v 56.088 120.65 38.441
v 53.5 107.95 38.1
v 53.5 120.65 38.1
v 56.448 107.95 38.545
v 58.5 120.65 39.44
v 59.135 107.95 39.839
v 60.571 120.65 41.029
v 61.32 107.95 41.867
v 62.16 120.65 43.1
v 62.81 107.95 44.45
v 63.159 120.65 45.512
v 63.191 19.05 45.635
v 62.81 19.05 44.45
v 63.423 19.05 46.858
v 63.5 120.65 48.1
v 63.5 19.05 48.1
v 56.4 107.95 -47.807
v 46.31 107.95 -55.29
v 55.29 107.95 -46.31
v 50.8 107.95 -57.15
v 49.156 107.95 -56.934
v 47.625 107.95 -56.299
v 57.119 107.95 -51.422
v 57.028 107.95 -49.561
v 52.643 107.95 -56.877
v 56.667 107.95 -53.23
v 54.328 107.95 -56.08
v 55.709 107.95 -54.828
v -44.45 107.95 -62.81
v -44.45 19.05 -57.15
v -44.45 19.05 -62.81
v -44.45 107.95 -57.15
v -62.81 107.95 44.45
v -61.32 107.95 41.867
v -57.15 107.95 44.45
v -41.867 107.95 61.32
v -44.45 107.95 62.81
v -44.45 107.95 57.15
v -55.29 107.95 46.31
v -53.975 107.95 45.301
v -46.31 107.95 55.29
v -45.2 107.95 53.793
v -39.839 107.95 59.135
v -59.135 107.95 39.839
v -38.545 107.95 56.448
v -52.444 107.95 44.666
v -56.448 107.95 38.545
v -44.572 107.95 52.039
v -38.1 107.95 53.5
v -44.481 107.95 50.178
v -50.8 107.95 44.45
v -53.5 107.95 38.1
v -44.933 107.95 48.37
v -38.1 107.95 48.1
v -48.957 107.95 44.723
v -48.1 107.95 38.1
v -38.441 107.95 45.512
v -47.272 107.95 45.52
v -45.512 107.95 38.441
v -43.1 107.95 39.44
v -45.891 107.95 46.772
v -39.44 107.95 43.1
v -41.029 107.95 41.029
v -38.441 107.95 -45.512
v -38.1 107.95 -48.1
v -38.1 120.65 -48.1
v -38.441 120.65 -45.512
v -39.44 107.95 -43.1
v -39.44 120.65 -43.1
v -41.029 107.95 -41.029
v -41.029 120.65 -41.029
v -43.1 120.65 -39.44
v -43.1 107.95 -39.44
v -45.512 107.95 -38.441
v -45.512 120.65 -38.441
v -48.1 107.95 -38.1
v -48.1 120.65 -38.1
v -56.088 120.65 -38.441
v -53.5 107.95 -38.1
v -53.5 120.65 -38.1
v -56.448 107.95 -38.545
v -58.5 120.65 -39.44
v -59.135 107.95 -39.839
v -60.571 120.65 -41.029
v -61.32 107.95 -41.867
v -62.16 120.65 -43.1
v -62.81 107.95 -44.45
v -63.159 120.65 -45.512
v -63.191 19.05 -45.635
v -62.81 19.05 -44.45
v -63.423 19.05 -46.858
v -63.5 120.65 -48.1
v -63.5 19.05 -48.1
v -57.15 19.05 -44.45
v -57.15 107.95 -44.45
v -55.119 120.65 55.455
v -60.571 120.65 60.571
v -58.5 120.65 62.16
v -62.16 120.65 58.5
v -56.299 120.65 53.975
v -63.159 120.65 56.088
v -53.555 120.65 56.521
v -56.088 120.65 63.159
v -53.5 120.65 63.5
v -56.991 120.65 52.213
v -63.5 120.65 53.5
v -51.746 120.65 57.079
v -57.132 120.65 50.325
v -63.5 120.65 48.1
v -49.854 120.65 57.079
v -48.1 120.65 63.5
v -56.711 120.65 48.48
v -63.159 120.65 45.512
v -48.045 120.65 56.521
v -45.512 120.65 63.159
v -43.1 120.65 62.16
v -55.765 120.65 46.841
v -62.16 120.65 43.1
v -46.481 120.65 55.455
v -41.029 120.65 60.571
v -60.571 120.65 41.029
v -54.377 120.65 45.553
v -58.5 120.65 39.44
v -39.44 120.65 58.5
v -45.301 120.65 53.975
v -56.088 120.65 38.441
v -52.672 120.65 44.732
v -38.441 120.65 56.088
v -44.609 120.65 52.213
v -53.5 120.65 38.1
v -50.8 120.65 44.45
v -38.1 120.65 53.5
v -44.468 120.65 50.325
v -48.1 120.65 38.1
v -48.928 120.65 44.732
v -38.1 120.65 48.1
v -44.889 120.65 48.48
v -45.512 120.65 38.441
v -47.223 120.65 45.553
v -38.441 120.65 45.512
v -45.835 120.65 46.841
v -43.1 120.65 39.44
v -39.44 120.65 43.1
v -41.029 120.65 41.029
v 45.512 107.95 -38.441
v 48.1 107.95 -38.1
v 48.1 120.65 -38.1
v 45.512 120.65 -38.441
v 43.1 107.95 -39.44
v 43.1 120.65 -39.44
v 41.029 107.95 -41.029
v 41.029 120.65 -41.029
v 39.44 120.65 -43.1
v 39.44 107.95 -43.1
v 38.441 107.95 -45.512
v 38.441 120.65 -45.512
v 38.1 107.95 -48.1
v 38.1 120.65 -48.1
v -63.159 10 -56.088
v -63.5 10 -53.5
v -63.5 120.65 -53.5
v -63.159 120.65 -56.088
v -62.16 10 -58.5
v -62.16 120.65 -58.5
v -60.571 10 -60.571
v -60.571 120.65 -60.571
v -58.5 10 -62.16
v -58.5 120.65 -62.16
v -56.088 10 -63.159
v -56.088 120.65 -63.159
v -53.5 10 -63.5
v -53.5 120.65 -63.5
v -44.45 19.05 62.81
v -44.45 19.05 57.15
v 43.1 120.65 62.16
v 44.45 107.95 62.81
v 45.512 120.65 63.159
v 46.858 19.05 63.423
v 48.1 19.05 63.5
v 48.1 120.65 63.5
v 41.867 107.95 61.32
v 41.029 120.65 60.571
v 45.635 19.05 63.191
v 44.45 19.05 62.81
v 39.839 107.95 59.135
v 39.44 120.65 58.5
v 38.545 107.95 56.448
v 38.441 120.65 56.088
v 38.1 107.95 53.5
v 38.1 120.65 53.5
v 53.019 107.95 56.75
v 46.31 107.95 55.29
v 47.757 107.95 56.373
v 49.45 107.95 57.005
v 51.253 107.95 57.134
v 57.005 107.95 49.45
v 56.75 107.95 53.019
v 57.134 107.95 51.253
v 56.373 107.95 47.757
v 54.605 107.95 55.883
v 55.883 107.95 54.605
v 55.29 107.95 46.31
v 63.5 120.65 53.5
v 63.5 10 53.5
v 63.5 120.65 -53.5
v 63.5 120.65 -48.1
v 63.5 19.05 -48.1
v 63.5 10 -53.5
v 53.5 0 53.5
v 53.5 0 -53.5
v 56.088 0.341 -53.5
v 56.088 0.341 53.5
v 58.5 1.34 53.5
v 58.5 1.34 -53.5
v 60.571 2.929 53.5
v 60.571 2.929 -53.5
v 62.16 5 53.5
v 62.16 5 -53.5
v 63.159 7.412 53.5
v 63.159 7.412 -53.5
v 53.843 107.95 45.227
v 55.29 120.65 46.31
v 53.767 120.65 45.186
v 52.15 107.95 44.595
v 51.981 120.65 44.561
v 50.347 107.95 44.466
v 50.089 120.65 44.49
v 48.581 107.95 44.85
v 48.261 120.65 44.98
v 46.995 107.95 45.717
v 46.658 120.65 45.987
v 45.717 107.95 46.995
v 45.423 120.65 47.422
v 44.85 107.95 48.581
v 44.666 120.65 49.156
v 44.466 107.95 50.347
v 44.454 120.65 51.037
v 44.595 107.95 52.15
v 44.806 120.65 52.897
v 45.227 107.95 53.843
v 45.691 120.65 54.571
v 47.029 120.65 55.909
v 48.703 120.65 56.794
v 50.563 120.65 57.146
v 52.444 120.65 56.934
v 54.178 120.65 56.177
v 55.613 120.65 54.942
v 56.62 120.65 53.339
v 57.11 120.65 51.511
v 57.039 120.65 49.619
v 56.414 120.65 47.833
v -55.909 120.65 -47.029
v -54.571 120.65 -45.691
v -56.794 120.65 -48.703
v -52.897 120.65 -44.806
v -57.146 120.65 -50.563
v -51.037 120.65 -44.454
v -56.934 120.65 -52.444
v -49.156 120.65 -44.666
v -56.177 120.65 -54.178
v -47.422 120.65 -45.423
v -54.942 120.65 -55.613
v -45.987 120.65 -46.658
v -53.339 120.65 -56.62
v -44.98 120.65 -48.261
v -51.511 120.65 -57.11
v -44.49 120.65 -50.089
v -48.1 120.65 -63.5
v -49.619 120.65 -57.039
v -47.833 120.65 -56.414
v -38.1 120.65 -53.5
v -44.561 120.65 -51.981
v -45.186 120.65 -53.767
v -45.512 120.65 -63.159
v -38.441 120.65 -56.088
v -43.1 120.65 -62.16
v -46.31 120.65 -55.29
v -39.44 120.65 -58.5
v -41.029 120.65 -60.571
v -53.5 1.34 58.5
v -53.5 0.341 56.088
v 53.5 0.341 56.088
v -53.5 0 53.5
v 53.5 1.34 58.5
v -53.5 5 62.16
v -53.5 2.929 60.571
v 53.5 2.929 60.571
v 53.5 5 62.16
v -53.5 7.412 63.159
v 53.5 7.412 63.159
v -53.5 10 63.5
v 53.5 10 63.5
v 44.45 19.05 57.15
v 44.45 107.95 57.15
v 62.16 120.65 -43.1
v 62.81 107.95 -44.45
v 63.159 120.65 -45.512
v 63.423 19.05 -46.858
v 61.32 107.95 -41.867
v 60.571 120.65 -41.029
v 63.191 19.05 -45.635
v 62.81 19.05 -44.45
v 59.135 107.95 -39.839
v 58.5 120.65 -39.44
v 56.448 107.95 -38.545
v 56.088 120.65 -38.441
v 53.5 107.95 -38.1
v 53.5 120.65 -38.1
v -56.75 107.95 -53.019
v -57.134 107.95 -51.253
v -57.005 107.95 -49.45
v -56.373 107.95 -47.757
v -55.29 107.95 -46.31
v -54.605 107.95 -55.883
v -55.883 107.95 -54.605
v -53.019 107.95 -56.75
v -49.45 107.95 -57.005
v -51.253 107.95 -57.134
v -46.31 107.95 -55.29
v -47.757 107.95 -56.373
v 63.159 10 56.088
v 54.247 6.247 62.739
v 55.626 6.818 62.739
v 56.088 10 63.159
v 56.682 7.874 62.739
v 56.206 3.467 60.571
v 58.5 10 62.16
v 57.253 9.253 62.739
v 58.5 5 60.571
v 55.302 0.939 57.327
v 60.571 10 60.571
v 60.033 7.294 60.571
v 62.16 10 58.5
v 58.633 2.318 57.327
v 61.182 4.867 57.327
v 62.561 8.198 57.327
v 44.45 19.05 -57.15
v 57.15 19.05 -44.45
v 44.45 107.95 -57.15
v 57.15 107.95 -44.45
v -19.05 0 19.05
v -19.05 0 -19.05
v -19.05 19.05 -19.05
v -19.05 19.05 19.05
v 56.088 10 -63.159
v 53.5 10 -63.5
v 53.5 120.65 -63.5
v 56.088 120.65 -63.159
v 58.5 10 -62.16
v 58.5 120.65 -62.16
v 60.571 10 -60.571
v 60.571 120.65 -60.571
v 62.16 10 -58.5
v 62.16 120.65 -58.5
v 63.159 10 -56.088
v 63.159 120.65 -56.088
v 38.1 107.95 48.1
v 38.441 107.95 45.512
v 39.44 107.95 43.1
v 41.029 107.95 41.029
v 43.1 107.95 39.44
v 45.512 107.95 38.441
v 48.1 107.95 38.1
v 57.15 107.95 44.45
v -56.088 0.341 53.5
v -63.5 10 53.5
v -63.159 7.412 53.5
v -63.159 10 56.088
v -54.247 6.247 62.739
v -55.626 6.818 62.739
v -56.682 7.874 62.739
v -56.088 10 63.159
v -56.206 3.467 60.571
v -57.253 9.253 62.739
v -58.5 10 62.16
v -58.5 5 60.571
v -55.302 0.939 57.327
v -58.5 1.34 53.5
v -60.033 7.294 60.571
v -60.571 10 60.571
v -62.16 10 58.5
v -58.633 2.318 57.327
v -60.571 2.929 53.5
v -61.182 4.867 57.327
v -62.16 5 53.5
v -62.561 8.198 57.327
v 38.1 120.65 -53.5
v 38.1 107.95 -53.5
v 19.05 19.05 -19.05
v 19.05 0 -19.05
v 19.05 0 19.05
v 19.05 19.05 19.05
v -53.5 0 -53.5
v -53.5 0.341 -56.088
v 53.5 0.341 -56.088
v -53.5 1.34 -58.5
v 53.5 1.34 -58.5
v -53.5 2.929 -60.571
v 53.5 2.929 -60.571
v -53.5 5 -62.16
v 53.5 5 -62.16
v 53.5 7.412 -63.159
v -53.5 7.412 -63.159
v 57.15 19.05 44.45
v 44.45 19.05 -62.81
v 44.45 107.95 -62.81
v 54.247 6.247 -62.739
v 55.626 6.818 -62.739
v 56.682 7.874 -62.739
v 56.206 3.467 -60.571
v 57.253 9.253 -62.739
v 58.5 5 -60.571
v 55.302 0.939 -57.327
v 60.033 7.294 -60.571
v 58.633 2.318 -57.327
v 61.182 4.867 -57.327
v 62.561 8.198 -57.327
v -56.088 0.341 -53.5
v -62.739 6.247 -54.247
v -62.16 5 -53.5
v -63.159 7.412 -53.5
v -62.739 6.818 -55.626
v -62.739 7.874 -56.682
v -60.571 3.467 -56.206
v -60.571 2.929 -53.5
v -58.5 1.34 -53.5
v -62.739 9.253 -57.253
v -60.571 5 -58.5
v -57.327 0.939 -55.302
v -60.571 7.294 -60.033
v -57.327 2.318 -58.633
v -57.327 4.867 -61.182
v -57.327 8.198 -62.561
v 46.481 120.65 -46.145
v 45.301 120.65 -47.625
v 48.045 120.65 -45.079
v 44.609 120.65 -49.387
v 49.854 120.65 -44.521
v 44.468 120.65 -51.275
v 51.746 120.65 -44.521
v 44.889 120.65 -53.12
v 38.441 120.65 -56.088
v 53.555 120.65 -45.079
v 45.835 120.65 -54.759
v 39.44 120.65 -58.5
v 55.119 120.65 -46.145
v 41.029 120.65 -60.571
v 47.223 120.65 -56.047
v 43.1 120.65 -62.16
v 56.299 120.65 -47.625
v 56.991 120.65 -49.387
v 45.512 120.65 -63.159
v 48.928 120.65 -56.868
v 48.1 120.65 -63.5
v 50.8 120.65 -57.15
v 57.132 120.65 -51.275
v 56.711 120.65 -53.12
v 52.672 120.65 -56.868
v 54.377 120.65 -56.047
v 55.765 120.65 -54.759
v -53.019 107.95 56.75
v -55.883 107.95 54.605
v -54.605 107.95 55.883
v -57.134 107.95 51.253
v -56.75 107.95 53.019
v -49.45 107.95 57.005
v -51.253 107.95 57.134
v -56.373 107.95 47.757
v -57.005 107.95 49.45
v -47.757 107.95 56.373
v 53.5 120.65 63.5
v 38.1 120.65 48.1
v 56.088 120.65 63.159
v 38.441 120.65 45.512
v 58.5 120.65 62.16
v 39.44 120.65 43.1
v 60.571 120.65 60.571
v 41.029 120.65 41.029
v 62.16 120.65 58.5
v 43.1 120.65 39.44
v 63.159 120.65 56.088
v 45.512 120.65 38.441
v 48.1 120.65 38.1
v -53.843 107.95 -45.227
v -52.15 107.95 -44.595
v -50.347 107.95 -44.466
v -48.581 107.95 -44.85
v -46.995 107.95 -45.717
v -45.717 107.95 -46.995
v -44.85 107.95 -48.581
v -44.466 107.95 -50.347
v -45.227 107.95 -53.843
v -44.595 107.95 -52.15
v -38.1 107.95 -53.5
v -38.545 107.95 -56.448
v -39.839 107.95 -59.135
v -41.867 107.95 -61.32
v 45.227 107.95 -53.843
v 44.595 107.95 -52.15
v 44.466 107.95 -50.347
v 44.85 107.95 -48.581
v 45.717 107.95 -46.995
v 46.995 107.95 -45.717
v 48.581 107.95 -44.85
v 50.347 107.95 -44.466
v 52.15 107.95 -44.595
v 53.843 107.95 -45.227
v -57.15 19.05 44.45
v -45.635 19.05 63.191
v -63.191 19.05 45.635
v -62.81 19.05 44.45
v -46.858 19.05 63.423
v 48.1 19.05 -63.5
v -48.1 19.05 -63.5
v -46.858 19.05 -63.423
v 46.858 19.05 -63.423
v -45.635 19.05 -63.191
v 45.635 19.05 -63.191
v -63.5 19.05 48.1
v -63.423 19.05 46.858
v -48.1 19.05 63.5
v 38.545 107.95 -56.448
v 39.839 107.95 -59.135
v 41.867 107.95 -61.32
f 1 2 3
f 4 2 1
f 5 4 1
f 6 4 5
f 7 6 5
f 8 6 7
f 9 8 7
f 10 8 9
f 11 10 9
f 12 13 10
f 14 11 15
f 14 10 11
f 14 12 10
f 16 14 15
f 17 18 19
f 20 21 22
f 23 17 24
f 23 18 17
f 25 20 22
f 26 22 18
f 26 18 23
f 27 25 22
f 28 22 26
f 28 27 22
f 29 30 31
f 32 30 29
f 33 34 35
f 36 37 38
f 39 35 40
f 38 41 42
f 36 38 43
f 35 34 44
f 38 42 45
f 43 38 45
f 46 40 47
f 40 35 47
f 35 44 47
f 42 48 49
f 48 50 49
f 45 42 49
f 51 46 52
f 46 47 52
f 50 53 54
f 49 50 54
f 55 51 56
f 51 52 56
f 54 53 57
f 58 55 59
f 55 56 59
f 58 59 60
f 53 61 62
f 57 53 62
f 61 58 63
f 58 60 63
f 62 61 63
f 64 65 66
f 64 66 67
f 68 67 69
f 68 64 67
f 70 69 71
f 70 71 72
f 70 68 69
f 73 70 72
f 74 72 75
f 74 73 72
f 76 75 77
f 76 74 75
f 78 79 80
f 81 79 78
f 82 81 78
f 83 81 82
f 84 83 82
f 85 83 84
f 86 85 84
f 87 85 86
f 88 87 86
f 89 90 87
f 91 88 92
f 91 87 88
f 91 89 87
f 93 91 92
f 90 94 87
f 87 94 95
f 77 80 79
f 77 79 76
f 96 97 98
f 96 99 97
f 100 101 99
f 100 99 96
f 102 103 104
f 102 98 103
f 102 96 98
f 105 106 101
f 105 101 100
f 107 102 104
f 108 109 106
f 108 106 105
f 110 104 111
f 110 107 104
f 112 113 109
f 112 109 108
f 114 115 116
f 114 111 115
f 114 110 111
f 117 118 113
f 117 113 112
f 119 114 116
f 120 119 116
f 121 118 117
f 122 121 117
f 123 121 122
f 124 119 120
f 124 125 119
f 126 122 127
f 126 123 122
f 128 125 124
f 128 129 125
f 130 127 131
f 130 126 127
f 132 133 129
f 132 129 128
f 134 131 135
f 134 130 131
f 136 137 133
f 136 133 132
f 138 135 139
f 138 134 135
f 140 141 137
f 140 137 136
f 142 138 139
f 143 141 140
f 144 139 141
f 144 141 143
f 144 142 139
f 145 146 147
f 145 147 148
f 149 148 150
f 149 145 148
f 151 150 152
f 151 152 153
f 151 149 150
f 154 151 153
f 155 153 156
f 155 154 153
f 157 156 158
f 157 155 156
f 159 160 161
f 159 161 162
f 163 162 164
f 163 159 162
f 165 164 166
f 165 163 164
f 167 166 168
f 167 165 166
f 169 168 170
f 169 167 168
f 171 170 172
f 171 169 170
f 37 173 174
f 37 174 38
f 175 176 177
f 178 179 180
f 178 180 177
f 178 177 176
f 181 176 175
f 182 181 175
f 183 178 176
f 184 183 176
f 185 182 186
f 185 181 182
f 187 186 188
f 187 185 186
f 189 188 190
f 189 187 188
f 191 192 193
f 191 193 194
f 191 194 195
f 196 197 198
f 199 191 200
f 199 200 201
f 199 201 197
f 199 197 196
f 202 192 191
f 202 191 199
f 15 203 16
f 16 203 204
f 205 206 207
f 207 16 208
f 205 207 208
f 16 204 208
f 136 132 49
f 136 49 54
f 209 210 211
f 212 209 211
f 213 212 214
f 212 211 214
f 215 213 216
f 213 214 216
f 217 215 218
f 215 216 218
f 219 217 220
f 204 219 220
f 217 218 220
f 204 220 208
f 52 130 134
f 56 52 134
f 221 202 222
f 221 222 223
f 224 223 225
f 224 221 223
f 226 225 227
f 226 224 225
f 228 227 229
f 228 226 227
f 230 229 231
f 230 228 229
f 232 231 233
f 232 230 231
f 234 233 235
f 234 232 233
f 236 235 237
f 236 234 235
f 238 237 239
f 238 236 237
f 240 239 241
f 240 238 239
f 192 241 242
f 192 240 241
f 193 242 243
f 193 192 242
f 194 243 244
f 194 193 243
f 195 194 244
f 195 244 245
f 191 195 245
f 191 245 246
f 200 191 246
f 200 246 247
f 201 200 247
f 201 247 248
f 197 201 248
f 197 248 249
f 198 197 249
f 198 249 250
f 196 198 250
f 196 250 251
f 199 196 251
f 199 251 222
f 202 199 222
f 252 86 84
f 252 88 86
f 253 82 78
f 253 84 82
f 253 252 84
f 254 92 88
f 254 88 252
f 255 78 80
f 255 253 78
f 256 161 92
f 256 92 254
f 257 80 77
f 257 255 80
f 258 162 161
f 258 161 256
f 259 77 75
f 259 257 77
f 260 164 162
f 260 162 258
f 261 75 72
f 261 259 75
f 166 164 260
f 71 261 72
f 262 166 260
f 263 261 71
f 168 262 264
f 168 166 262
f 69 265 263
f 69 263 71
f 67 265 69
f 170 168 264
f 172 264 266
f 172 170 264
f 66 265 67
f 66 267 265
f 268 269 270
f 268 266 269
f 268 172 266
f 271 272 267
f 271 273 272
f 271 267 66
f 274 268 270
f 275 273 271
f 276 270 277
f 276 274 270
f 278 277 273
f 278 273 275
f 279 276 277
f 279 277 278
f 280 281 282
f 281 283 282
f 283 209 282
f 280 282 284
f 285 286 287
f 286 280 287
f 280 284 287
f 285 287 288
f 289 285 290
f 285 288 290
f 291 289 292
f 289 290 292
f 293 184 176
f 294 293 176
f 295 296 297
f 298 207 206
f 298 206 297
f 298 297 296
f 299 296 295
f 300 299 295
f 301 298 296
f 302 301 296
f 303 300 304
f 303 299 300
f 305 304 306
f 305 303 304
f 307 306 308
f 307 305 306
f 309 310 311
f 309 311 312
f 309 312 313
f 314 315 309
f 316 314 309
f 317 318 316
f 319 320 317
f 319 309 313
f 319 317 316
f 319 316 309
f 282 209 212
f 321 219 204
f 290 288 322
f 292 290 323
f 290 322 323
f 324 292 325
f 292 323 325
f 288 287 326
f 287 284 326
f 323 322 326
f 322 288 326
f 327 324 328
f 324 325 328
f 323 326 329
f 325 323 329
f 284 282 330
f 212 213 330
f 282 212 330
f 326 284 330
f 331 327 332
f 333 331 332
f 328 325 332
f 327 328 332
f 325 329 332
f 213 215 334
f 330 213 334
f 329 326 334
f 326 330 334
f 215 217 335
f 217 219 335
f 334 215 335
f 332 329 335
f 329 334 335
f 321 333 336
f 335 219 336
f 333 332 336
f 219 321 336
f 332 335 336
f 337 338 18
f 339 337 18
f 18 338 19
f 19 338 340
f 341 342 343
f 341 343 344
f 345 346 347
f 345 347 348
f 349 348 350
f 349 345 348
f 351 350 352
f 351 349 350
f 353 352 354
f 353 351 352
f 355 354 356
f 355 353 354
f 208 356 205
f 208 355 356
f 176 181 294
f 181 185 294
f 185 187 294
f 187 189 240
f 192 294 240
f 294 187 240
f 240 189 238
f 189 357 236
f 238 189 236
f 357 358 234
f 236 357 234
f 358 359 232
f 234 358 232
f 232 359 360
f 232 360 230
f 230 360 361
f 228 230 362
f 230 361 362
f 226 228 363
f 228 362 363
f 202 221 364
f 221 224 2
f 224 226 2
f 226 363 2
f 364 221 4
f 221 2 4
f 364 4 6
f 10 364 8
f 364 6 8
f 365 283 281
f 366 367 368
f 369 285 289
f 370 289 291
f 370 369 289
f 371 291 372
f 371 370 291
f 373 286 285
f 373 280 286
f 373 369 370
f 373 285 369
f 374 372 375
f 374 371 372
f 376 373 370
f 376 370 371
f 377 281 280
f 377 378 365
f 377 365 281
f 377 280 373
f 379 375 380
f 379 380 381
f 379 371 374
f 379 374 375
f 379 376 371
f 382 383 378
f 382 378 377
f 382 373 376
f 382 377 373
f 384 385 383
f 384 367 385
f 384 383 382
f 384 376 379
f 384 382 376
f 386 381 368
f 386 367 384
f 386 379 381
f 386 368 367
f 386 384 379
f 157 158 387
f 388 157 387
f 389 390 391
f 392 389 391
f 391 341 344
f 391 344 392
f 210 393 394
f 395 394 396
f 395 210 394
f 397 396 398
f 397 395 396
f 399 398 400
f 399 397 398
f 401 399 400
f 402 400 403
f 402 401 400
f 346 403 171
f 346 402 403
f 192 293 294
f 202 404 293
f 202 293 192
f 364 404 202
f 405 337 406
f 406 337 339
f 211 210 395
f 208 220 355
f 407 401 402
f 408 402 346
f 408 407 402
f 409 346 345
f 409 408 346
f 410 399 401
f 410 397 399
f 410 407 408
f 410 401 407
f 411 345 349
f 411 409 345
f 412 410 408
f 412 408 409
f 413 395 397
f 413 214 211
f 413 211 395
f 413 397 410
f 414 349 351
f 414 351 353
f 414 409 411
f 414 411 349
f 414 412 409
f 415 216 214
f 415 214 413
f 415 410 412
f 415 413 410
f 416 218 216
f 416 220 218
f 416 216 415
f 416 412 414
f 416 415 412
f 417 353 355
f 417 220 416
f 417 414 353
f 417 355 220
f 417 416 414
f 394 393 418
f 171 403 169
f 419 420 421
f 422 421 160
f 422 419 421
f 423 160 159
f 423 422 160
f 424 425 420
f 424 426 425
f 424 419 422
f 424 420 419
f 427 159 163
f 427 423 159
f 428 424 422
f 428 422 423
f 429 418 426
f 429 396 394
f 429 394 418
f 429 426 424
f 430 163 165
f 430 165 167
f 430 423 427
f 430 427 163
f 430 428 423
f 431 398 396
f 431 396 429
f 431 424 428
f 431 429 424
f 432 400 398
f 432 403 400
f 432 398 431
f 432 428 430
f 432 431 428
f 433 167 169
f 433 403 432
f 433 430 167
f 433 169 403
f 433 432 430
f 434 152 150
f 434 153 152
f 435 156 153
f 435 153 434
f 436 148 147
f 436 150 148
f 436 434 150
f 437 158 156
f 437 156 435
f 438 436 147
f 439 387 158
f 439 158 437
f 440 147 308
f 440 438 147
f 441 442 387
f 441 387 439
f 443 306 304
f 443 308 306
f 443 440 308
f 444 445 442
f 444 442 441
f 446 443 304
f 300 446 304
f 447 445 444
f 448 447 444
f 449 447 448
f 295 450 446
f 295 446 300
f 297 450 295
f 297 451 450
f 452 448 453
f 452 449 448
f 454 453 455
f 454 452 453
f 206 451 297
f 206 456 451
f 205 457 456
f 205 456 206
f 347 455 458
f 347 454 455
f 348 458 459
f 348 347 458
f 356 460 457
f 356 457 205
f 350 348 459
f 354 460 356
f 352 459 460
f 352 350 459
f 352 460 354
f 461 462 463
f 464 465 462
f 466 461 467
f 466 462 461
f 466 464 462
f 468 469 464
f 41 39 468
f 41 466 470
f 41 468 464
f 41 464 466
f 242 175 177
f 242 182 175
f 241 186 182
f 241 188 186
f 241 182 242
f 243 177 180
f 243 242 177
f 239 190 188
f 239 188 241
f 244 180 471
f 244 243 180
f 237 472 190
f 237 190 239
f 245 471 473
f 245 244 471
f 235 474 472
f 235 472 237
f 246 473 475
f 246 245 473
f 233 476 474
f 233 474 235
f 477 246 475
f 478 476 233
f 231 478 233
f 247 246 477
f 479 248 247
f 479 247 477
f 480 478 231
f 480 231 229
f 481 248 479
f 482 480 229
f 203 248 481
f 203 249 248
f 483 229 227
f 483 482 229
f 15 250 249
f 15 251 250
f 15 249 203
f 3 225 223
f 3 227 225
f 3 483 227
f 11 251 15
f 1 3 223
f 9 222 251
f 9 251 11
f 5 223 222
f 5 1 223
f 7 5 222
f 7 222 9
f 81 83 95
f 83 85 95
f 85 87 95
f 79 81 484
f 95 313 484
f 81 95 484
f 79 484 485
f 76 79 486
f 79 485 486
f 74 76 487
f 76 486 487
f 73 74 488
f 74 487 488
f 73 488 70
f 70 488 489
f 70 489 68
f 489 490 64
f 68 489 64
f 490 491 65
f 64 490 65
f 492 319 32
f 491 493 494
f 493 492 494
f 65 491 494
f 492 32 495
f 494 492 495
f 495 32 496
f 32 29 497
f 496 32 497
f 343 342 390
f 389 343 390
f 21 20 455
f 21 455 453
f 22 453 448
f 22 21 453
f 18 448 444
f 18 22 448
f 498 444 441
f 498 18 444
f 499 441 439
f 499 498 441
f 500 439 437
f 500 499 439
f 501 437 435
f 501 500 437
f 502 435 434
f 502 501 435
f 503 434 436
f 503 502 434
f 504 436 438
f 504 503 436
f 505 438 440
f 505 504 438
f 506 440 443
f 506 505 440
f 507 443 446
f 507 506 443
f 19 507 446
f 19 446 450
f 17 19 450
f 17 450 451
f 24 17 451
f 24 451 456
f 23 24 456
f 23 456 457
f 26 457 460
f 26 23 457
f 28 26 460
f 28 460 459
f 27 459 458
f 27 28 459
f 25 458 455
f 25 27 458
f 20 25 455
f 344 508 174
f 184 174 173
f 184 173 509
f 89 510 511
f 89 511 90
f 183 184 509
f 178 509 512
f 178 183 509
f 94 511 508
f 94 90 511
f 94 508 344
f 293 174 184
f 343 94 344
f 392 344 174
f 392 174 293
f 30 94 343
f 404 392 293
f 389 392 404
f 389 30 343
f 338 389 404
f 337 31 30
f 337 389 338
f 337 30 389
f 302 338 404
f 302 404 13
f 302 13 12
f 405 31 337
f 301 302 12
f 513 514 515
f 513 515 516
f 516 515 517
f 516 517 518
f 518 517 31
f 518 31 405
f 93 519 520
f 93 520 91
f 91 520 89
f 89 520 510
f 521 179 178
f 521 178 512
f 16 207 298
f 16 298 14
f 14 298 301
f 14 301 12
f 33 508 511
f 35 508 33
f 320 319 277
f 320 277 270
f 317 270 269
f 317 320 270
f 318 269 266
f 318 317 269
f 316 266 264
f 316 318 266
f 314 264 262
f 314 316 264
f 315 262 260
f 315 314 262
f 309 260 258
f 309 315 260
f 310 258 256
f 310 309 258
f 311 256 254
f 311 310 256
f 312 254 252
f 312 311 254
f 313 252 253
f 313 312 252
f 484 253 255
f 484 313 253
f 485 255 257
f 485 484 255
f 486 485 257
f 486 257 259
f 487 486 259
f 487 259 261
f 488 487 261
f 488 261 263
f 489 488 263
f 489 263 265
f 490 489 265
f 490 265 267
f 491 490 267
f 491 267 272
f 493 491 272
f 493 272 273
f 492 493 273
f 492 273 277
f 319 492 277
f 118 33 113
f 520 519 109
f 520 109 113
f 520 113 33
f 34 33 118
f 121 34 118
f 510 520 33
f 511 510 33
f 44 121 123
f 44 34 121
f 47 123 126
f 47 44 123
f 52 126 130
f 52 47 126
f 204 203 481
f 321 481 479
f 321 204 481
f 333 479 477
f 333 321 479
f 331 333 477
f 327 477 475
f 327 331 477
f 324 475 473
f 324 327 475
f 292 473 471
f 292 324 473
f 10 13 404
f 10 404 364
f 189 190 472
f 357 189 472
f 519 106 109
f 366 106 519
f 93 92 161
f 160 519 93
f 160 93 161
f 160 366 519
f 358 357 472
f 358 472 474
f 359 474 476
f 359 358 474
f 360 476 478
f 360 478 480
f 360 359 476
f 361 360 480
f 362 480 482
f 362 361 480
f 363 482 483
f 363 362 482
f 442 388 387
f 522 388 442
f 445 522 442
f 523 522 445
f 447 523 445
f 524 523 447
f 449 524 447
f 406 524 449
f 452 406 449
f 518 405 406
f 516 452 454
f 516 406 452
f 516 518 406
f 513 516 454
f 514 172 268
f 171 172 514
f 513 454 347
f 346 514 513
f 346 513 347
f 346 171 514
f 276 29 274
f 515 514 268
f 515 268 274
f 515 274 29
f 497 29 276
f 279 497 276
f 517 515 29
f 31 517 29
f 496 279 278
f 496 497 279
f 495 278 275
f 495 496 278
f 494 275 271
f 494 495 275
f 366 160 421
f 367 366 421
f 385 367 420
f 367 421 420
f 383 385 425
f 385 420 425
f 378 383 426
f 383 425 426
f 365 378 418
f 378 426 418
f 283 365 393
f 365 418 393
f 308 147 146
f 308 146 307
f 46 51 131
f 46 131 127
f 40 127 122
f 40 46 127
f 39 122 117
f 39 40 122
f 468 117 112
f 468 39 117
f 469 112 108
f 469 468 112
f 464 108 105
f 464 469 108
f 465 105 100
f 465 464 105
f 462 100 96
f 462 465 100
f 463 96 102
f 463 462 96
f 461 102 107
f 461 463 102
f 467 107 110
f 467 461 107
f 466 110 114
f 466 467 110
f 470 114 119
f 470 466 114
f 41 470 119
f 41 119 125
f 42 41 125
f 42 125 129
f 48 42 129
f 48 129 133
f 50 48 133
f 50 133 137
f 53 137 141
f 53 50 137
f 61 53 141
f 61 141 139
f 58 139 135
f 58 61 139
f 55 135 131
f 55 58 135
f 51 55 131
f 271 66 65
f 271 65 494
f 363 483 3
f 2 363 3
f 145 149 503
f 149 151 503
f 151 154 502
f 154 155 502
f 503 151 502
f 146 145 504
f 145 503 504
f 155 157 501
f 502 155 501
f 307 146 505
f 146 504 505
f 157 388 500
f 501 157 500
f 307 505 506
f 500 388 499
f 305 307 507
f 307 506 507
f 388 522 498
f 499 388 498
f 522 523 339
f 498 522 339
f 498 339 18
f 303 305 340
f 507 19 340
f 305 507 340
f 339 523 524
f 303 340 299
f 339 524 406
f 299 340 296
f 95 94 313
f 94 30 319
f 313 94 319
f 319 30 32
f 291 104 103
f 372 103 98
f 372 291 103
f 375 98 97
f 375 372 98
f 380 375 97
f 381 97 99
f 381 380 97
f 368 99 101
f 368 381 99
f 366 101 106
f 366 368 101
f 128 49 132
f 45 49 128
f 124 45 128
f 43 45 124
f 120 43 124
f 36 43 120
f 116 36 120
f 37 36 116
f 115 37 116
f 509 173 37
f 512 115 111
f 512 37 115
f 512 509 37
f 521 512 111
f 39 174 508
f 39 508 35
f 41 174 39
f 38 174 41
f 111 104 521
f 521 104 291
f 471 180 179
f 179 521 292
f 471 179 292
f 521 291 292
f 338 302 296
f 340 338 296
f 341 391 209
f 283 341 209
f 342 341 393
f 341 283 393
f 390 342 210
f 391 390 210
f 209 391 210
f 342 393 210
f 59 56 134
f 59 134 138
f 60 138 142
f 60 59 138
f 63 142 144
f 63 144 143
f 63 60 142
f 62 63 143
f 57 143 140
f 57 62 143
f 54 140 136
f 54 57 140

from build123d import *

# Parameters (mm, degrees)
SKETCH1_W           = 127
SKETCH1_H           = 127
BOSS_EXTRUDE1_DEPTH = 107.95
SKETCH2_W           = 88.9
SKETCH2_H           = 88.9
CUT_EXTRUDE1_DEPTH  = 179.366063196
SKETCH4_W           = 88.9
SKETCH4_H           = 88.9
CUT_EXTRUDE4_DEPTH  = 179.366063196
CUT_EXTRUDE5_REACH  = 142.42
SKETCH6_W           = 38.1
SKETCH6_H           = 38.1
FILLET1_R           = 10
CHAMFER2_SIZE       = 12.7
SKETCH7_W           = 25.4
SKETCH7_H           = 25.4
SKETCH7_R           = 6.35
BOSS_EXTRUDE2_DEPTH = 12.7
FILLET2_START       = 19.05
FILLET2_DEPTH       = 101.6


with BuildPart() as part:
    # Sketch1 → Boss-Extrude1 (new body)
    with BuildSketch(Plane(origin=(0, 0, 0), x_dir=(1, 0, 0), z_dir=(0, 1, 0))):
        Rectangle(SKETCH1_W, SKETCH1_H)
    extrude(amount=BOSS_EXTRUDE1_DEPTH)

    # Sketch2 → Cut-Extrude1 (cut, through all)
    with BuildSketch(Plane.XY.offset(63.5)):
        with Locations((0, 63.5)):
            Rectangle(SKETCH2_W, SKETCH2_H)
    extrude(amount=-CUT_EXTRUDE1_DEPTH, mode=Mode.SUBTRACT)

    # Sketch4 → Cut-Extrude4 (cut, through all)
    with BuildSketch(Plane(origin=(63.5, 0, 0), x_dir=(0, 0, -1), z_dir=(1, 0, 0))):
        with Locations((0, 63.5)):
            Rectangle(SKETCH4_W, SKETCH4_H)
    extrude(amount=-CUT_EXTRUDE4_DEPTH, mode=Mode.SUBTRACT)

    # Sketch6 → Cut-Extrude5 (cut, up to next)
    with BuildSketch(Plane.XZ, mode=Mode.PRIVATE) as cut_extrude5_sk1:
        Rectangle(SKETCH6_W, SKETCH6_H)
    cut_extrude5_tool1 = extrude(cut_extrude5_sk1.sketch, amount=-CUT_EXTRUDE5_REACH, mode=Mode.PRIVATE) & part.part
    add(cut_extrude5_tool1.solids().sort_by_distance((0, 0, 0))[0], mode=Mode.SUBTRACT)

    # Fillet1
    fillet1_edges = [part.edges().sort_by_distance(p)[0] for p in [
        (63.5, 0, 0),
        (0, 0, -63.5),
        (-63.5, 0, 0),
        (0, 0, 63.5),
        (63.5, 53.975, 63.5),
        (63.5, 53.975, -63.5),
        (-63.5, 53.975, -63.5),
        (-63.5, 53.975, 63.5),
    ]]
    fillet(fillet1_edges, radius=FILLET1_R)

    # Chamfer2
    chamfer2_edges = [part.edges().sort_by_distance(p)[0] for p in [
        (-44.45, 63.5, -44.45),
        (44.45, 63.5, -44.45),
        (-44.45, 63.5, 44.45),
        (44.45, 63.5, 44.45),
    ]]
    chamfer(chamfer2_edges, length=CHAMFER2_SIZE)

    # Sketch7 → Boss-Extrude2 (add)
    # profile 1 of 4: a face of its own
    with BuildSketch(Plane(origin=(0, 107.95, 0), x_dir=(1, 0, 0), z_dir=(0, 1, 0))):
        with Locations((50.8, 50.8)):
            Rectangle(SKETCH7_W, SKETCH7_H)
        with Locations(Location((50.8, 50.8, 0), (0, 0, 90))):
            Circle(SKETCH7_R, mode=Mode.SUBTRACT)
    # profile 2 of 4: a face of its own
    with BuildSketch(Plane(origin=(0, 107.95, 0), x_dir=(1, 0, 0), z_dir=(0, 1, 0))):
        with Locations((-50.8, 50.8)):
            Rectangle(SKETCH7_W, SKETCH7_H)
        with Locations(Location((-50.8, 50.8, 0), (0, 0, 45))):
            Circle(SKETCH7_R, mode=Mode.SUBTRACT)
    # profile 3 of 4: a face of its own
    with BuildSketch(Plane(origin=(0, 107.95, 0), x_dir=(1, 0, 0), z_dir=(0, 1, 0))):
        with Locations((-50.8, -50.8)):
            Rectangle(SKETCH7_W, SKETCH7_H)
        with Locations(Location((-50.8, -50.8, 0), (0, 0, 90))):
            Circle(SKETCH7_R, mode=Mode.SUBTRACT)
    # profile 4 of 4: a face of its own
    with BuildSketch(Plane(origin=(0, 107.95, 0), x_dir=(1, 0, 0), z_dir=(0, 1, 0))):
        with Locations((50.8, -50.8)):
            Rectangle(SKETCH7_W, SKETCH7_H)
        with Locations(Location((50.8, -50.8, 0), (0, 0, 45))):
            Circle(SKETCH7_R, mode=Mode.SUBTRACT)
    extrude(amount=BOSS_EXTRUDE2_DEPTH)

    # Fillet2: read off the stored shape, not the designer's step
    # Fillet2 outline → Fillet2 (cut)
    with BuildSketch(Plane(origin=(0, 0, 0), x_dir=(1, 0, 0), z_dir=(0, 1, 0)).offset(FILLET2_START)):
        with BuildLine():
            Line((63.5, -63.5), (63.5, -53.5))
            ThreePointArc((63.5, -53.5), (60.571067812, -60.571067812), (53.5, -63.5))
            Line((53.5, -63.5), (63.5, -63.5))
        make_face()
        with BuildLine():
            Line((63.5, -48.1), (63.5, -38.1))
            Line((63.5, -38.1), (53.5, -38.1))
            ThreePointArc((53.5, -38.1), (60.571067812, -41.028932188), (63.5, -48.1))
        make_face()
        with BuildLine():
            ThreePointArc((48.1, -63.5), (41.028932188, -60.571067812), (38.1, -53.5))
            Line((38.1, -53.5), (38.1, -63.5))
            Line((38.1, -63.5), (48.1, -63.5))
        make_face()
        with BuildLine():
            ThreePointArc((38.1, -48.1), (41.028932188, -41.028932188), (48.1, -38.1))
            Line((48.1, -38.1), (38.1, -38.1))
            Line((38.1, -38.1), (38.1, -48.1))
        make_face()
        with BuildLine():
            Line((53.5, 38.1), (63.5, 38.1))
            Line((63.5, 38.1), (63.5, 48.1))
            ThreePointArc((63.5, 48.1), (60.571067812, 41.028932188), (53.5, 38.1))
        make_face()
        with BuildLine():
            Line((-38.1, -63.5), (-38.1, -53.5))
            ThreePointArc((-38.1, -53.5), (-41.028932188, -60.571067812), (-48.1, -63.5))
            Line((-48.1, -63.5), (-38.1, -63.5))
        make_face()
        with BuildLine():
            Line((38.1, 38.1), (48.1, 38.1))
            ThreePointArc((48.1, 38.1), (41.028932188, 41.028932188), (38.1, 48.1))
            Line((38.1, 48.1), (38.1, 38.1))
        make_face()
        with BuildLine():
            ThreePointArc((-48.1, -38.1), (-41.028932188, -41.028932188), (-38.1, -48.1))
            Line((-38.1, -48.1), (-38.1, -38.1))
            Line((-38.1, -38.1), (-48.1, -38.1))
        make_face()
        with BuildLine():
            ThreePointArc((53.5, 63.5), (60.571067812, 60.571067812), (63.5, 53.5))
            Line((63.5, 53.5), (63.5, 63.5))
            Line((63.5, 63.5), (53.5, 63.5))
        make_face()
        with BuildLine():
            Line((-63.5, -63.5), (-53.5, -63.5))
            ThreePointArc((-53.5, -63.5), (-60.571067812, -60.571067812), (-63.5, -53.5))
            Line((-63.5, -53.5), (-63.5, -63.5))
        make_face()
        with BuildLine():
            Line((38.1, 63.5), (38.1, 53.5))
            ThreePointArc((38.1, 53.5), (41.028932188, 60.571067812), (48.1, 63.5))
            Line((48.1, 63.5), (38.1, 63.5))
        make_face()
        with BuildLine():
            Line((-53.5, -38.1), (-63.5, -38.1))
            Line((-63.5, -38.1), (-63.5, -48.1))
            ThreePointArc((-63.5, -48.1), (-60.571067812, -41.028932188), (-53.5, -38.1))
        make_face()
        with BuildLine():
            Line((-38.1, 53.5), (-38.1, 63.5))
            Line((-38.1, 63.5), (-48.1, 63.5))
            ThreePointArc((-48.1, 63.5), (-41.028932188, 60.571067812), (-38.1, 53.5))
        make_face()
        with BuildLine():
            Line((-63.5, 38.1), (-53.5, 38.1))
            ThreePointArc((-53.5, 38.1), (-60.571067812, 41.028932188), (-63.5, 48.1))
            Line((-63.5, 48.1), (-63.5, 38.1))
        make_face()
        with BuildLine():
            Line((-38.1, 38.1), (-38.1, 48.1))
            ThreePointArc((-38.1, 48.1), (-41.028932188, 41.028932188), (-48.1, 38.1))
            Line((-48.1, 38.1), (-38.1, 38.1))
        make_face()
        with BuildLine():
            ThreePointArc((-63.5, 53.5), (-60.571067812, 60.571067812), (-53.5, 63.5))
            Line((-53.5, 63.5), (-63.5, 63.5))
            Line((-63.5, 63.5), (-63.5, 53.5))
        make_face()
    extrude(amount=FILLET2_DEPTH, mode=Mode.SUBTRACT)


solid = part.part
